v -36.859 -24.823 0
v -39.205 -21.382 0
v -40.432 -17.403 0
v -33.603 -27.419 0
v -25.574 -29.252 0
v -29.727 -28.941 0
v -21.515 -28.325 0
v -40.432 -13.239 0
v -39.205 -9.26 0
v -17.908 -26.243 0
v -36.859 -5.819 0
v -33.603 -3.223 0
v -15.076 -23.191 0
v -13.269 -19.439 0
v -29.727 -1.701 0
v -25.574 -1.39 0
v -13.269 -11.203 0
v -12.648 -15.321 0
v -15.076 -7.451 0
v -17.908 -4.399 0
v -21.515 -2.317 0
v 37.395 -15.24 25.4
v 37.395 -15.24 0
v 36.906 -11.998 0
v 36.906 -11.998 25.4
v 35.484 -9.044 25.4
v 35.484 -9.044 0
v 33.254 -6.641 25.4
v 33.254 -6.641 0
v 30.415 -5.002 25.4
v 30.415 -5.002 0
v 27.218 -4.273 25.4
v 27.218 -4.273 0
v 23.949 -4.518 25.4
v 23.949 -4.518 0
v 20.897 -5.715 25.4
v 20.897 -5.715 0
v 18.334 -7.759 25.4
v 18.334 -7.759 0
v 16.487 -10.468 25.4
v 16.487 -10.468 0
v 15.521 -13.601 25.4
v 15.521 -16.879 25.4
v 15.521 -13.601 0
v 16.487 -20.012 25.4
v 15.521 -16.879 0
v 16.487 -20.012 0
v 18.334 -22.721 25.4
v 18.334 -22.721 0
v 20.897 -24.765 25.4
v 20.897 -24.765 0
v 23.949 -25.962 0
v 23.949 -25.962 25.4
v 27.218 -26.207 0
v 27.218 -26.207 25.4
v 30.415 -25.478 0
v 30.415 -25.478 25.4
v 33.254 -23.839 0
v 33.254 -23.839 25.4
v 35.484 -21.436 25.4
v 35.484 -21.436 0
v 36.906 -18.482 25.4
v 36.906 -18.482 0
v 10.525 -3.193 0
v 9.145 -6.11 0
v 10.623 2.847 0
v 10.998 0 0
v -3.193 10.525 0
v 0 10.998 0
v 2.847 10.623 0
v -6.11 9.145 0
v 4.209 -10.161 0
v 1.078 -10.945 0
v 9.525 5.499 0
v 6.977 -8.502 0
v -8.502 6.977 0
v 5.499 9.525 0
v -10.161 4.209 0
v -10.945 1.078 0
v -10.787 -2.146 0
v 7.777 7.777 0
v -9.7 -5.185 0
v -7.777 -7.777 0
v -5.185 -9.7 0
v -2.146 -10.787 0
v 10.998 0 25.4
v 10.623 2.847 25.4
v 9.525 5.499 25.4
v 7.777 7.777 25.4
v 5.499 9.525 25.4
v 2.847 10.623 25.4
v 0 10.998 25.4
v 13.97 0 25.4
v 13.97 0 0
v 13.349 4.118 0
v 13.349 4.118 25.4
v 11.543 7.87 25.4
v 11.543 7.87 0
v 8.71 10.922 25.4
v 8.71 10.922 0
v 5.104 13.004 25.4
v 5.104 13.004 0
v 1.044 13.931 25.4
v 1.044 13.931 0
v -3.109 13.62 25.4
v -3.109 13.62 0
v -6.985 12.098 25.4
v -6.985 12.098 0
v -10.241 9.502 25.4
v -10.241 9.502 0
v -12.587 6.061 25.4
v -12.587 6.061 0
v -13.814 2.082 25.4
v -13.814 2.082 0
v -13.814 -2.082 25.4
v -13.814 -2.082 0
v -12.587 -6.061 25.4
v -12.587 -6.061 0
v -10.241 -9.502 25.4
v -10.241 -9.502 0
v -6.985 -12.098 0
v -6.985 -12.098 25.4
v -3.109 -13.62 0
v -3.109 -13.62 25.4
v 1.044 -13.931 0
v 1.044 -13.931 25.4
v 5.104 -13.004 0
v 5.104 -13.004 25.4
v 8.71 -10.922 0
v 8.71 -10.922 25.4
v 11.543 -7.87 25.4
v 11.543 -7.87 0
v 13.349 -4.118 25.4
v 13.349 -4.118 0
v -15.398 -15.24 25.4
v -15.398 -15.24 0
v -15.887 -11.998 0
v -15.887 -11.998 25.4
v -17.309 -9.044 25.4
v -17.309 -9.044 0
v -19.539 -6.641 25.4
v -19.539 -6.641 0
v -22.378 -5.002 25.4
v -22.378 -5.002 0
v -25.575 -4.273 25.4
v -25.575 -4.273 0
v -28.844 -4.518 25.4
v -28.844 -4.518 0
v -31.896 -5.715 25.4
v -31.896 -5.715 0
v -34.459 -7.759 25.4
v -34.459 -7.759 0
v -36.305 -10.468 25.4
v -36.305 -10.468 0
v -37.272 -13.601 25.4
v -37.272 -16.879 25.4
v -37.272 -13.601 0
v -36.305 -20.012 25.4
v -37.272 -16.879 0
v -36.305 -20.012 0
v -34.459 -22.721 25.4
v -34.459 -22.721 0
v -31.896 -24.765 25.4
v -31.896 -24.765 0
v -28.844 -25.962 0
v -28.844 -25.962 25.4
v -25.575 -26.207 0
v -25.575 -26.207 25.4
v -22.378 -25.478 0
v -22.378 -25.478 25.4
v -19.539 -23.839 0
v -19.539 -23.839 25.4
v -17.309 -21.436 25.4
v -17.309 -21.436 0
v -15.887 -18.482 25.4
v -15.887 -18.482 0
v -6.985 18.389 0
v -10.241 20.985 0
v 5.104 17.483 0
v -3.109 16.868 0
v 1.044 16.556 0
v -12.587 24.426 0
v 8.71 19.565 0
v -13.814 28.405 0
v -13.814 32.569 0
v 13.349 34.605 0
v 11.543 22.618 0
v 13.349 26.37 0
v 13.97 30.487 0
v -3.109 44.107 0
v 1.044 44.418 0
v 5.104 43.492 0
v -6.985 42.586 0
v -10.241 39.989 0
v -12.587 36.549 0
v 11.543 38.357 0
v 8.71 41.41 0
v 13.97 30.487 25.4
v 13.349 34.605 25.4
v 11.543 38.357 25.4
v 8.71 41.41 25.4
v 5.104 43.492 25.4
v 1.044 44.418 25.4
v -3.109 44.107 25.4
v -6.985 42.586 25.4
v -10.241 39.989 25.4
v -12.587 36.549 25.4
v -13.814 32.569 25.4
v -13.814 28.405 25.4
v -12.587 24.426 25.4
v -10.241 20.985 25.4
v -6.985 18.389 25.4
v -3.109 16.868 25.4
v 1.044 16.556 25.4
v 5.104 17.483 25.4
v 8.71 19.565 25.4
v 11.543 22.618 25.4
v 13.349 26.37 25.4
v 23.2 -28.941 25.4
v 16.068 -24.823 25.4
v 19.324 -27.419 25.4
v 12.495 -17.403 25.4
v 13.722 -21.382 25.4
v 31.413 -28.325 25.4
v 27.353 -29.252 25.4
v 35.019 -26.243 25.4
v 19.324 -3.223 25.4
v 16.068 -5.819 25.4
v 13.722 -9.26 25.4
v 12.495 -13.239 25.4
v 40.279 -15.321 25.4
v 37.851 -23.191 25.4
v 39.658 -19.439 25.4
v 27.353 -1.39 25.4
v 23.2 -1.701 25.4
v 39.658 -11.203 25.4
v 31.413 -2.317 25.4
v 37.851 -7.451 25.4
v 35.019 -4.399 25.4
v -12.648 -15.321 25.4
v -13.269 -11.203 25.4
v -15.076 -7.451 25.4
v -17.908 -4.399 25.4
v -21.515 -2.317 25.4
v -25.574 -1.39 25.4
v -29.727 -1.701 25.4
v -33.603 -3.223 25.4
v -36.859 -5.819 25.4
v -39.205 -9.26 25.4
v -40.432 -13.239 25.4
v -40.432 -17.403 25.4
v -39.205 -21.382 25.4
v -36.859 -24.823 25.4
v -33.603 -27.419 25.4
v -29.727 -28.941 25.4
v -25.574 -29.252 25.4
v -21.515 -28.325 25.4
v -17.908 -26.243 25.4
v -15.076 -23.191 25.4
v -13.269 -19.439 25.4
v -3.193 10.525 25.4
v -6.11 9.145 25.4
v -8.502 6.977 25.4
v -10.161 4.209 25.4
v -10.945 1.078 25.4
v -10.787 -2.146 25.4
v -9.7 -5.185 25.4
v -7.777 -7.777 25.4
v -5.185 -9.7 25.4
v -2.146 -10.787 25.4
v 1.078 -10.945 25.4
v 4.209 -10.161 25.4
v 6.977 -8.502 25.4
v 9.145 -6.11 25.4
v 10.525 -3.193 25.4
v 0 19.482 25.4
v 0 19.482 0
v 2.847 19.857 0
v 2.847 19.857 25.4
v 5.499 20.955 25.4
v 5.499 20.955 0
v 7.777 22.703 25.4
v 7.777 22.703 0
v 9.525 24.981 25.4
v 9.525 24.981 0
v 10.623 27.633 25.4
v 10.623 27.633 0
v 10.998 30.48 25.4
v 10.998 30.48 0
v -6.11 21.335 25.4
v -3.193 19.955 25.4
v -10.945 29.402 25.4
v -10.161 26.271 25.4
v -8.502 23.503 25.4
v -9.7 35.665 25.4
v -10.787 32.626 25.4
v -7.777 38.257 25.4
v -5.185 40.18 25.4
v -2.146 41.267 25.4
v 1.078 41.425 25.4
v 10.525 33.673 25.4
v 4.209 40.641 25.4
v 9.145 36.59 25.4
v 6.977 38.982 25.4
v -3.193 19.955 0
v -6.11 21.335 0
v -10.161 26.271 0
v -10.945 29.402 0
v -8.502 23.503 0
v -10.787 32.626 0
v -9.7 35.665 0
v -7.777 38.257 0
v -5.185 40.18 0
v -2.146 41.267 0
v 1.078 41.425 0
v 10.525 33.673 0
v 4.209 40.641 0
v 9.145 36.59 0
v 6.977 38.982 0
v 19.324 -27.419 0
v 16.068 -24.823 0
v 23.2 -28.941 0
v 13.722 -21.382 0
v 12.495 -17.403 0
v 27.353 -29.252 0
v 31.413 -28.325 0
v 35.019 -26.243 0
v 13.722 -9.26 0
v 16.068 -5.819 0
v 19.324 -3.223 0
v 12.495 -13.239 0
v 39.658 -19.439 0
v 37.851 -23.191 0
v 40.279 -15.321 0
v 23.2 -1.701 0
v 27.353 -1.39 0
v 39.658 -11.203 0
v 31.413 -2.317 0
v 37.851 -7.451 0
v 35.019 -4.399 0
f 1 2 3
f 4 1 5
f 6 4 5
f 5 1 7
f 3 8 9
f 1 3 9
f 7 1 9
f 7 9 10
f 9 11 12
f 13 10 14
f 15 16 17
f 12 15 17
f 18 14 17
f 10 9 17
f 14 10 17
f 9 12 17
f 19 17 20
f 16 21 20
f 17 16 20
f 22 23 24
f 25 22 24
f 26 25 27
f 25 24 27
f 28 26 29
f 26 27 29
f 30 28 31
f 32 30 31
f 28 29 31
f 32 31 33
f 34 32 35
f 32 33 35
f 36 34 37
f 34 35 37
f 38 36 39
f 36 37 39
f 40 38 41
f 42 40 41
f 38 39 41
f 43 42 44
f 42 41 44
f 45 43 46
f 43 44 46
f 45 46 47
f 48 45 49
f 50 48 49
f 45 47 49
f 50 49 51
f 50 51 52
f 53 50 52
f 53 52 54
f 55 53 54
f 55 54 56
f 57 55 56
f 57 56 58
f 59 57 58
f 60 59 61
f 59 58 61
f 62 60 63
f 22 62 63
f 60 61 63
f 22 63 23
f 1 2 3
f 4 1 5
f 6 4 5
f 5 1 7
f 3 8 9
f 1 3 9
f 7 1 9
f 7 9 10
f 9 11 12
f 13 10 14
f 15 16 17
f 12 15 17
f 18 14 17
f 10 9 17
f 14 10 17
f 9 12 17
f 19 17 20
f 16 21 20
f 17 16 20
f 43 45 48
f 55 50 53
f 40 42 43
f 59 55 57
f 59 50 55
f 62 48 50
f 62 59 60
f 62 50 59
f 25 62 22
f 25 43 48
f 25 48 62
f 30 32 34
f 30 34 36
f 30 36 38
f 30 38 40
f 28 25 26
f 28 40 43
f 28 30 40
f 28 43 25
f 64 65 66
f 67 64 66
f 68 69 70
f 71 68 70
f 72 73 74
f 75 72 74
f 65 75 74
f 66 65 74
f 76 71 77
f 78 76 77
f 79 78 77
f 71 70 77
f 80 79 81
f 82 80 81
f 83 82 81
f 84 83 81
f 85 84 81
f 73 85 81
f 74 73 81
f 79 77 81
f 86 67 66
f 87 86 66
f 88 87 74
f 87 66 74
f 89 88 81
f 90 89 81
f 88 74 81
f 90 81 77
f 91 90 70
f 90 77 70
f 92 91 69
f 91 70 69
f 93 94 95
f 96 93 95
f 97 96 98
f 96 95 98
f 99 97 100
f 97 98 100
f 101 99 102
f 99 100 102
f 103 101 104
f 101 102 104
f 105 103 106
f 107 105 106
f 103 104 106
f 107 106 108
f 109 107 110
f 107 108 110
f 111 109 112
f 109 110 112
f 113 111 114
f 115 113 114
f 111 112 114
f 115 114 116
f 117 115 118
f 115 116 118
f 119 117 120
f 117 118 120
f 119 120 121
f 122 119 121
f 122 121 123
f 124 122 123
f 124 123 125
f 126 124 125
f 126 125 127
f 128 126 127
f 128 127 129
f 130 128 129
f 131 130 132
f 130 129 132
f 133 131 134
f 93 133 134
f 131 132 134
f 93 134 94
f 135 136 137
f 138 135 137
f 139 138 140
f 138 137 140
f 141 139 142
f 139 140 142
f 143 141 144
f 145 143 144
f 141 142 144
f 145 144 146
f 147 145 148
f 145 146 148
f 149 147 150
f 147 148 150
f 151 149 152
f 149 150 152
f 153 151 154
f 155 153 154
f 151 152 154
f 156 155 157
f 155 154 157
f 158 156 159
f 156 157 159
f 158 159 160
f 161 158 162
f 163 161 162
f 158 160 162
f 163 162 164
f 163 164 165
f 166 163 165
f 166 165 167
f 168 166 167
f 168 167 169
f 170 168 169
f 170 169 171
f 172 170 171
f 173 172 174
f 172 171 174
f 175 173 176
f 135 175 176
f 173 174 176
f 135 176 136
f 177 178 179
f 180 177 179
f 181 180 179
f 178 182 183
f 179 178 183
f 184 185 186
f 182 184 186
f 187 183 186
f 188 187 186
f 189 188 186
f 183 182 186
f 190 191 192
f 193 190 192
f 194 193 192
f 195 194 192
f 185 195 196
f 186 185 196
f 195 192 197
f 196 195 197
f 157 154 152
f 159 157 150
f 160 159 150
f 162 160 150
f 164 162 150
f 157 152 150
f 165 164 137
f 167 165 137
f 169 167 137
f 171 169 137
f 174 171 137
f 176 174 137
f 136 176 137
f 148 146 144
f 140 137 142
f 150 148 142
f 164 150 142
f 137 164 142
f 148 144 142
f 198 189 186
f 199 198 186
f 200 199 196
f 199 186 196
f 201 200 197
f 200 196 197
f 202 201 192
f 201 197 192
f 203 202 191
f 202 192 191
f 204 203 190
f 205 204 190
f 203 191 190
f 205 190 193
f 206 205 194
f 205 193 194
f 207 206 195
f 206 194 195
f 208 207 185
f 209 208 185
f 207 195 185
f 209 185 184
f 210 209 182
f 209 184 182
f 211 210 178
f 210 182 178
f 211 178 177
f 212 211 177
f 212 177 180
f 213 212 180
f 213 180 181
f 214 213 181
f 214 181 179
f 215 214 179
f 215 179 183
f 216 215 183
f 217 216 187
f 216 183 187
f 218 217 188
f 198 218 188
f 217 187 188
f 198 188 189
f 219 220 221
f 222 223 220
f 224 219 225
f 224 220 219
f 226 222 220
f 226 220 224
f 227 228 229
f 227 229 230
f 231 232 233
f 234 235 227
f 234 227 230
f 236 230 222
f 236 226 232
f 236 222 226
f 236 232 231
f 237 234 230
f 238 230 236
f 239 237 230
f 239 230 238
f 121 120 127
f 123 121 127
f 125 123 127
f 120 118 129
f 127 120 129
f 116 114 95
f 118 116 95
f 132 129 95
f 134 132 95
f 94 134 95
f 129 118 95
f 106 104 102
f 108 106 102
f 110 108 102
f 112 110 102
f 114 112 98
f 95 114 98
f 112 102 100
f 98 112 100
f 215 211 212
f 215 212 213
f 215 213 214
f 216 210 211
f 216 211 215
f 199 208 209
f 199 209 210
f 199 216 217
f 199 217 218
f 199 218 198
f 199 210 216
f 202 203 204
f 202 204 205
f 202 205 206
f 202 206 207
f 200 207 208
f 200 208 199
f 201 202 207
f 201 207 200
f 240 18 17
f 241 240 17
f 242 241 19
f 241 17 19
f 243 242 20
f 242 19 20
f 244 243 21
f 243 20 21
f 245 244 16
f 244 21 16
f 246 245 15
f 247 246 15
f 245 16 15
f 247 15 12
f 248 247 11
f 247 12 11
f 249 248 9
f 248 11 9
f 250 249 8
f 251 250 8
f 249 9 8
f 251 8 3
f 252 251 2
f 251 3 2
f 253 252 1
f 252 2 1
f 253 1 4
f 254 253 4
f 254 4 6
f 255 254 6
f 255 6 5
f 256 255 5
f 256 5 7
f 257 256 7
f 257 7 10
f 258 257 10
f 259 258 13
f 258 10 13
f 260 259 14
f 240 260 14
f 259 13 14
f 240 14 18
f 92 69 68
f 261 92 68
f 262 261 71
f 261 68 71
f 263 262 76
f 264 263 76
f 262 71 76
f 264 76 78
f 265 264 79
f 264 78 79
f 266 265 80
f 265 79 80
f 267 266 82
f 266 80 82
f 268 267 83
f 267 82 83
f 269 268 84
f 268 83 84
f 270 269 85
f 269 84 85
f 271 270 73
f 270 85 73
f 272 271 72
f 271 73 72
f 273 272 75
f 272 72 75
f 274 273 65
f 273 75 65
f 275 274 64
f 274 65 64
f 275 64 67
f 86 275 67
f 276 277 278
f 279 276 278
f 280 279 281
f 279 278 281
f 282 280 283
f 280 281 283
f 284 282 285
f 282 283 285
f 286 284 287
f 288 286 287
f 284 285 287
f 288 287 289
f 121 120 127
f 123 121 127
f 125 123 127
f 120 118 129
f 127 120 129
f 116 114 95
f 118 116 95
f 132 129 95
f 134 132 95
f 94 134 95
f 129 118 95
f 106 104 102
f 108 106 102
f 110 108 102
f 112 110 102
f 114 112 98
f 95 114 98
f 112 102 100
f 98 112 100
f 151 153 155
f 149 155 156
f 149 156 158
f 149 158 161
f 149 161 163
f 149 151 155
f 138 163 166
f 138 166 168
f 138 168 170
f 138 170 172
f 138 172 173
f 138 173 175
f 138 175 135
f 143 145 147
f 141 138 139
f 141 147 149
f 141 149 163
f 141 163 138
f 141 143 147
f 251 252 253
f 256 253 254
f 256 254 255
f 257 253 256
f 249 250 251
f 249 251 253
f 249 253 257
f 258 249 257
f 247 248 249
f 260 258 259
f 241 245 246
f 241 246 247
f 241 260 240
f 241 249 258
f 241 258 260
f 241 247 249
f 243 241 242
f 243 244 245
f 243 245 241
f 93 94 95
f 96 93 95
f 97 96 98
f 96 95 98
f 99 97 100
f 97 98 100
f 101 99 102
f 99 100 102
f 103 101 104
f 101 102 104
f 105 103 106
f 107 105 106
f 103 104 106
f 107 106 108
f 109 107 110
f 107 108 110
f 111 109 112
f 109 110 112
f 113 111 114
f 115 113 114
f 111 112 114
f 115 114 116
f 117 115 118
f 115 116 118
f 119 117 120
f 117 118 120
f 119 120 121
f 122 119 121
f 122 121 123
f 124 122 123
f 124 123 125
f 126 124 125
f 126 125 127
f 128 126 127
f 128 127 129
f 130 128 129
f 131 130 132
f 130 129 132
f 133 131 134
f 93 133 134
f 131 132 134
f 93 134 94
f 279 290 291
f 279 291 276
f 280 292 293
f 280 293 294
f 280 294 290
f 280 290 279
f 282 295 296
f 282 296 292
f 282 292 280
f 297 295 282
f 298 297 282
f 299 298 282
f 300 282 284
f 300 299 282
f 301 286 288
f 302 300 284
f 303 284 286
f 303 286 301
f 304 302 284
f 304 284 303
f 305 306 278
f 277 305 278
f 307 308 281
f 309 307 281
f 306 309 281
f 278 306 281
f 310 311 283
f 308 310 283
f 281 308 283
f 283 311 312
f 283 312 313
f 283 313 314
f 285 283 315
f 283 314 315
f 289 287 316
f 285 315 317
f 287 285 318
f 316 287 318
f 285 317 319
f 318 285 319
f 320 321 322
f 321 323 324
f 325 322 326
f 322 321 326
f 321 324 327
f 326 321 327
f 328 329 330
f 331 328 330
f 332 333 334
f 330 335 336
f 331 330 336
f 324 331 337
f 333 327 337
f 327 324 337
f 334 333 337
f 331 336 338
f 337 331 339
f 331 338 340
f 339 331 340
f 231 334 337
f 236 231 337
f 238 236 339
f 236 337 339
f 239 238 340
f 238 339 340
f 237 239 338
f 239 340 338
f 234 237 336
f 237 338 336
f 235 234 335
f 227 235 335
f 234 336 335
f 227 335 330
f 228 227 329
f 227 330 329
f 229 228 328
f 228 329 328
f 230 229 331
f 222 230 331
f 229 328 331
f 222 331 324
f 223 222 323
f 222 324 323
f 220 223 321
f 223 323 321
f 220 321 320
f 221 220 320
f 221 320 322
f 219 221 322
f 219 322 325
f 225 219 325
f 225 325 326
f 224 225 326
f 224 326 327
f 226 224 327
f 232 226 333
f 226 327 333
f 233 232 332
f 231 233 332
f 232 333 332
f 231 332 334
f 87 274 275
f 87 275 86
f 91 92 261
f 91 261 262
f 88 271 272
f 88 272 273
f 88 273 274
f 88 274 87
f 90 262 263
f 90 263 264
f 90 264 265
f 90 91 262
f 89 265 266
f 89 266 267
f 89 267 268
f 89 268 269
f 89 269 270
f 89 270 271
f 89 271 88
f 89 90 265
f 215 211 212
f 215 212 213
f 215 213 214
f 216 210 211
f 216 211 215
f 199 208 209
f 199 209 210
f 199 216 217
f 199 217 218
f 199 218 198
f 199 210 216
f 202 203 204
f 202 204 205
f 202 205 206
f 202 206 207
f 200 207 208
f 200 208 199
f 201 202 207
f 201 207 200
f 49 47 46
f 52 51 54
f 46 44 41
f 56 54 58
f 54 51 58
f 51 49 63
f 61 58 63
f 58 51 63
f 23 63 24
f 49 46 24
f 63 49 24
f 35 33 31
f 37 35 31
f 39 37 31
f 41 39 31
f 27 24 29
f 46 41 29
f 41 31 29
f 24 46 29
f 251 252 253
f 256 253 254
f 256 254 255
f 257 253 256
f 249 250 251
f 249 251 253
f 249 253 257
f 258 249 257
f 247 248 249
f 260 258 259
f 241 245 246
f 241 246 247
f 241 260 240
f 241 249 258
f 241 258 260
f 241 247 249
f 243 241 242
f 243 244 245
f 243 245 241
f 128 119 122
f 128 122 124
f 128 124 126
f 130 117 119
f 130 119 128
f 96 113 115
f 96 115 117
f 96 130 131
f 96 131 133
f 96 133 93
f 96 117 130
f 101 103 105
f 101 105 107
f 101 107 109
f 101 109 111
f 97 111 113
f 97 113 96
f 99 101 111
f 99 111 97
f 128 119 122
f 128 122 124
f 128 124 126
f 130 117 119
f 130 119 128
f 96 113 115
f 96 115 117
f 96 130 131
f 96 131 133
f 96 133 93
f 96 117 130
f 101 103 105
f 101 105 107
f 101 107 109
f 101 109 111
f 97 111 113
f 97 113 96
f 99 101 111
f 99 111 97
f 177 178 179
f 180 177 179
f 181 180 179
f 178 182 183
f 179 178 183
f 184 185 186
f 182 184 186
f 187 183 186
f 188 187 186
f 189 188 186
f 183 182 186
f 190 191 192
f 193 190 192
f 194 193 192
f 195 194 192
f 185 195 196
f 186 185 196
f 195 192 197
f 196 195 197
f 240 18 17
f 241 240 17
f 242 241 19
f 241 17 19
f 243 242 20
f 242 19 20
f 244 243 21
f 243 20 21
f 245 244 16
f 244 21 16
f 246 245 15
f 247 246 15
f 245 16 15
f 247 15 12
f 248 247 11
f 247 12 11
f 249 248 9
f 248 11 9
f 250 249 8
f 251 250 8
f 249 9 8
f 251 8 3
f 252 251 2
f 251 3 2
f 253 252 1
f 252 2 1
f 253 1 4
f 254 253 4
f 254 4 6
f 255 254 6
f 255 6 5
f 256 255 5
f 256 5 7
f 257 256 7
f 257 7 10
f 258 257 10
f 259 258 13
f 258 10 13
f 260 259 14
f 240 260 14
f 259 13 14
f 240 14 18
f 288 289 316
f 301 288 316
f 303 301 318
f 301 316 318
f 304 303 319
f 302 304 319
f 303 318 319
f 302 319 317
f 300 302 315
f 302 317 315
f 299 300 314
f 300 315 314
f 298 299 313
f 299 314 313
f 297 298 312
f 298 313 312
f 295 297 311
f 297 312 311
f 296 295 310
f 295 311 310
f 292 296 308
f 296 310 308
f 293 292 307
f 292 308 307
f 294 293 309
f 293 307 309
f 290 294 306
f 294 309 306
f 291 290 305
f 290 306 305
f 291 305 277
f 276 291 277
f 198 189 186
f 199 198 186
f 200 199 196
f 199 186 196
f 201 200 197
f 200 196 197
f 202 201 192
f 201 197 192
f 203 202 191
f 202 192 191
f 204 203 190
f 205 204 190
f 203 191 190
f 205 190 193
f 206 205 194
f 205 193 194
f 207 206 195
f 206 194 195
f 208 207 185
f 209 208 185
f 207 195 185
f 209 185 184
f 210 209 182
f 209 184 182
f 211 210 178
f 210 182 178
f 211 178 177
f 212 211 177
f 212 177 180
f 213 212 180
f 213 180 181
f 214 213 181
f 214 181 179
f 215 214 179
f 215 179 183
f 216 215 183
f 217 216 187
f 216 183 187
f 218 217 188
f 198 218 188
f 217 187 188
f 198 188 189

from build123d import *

# Parameters (mm, degrees)
F0_R     = 10.9982
F3_DEPTH = 25.4
F1_R     = 13.97
F4_DEPTH = 25.4


with BuildPart() as f3:
    # F0 (on Top) → F3 (new body)
    with BuildSketch(Plane.XY):
        with Locations((-26.3964543073, -15.24)):
            Circle(F0_R)
    extrude(amount=F3_DEPTH)


with BuildPart() as f3b:
    # F0 (on Top) → F3, piece 2 (new body)
    with BuildSketch(Plane.XY):
        with BuildLine():
            ThreePointArc((0, 10.9982), (-7.7769018008, -7.7769018008), (10.9982, 0))
            ThreePointArc((10.9982, 0), (7.7769018008, 7.7769018008), (0, 10.9982))
        make_face()
    extrude(amount=F3_DEPTH)


with BuildPart() as f3c:
    # F0 (on Top) → F3, piece 3 (new body)
    with BuildSketch(Plane.XY):
        with BuildLine():
            ThreePointArc((10.9982, 30.48), (-7.7769018008, 38.2569018008), (0, 19.4818))
            ThreePointArc((0, 19.4818), (7.7769018008, 22.7030981992), (10.9982, 30.48))
        make_face()
    extrude(amount=F3_DEPTH)


with BuildPart() as f3d:
    # F0 (on Top) → F3, piece 4 (new body)
    with BuildSketch(Plane.XY):
        with Locations((26.3964543073, -15.24)):
            Circle(F0_R)
    extrude(amount=F3_DEPTH)


with BuildPart() as f3e:
    # F1 (on Top) → F3, piece 5 (new body)
    with BuildSketch(Plane.XY):
        Circle(F1_R)
    extrude(amount=F3_DEPTH)


with BuildPart() as f3f:
    # F1 (on Top) → F3, piece 6 (new body)
    with BuildSketch(Plane.XY):
        with Locations((0, 30.487369746)):
            Circle(F1_R)
    extrude(amount=F3_DEPTH)


with BuildPart() as f3g:
    # F1 (on Top) → F3, piece 7 (new body)
    with BuildSketch(Plane.XY):
        with Locations((-26.6184136271, -15.3210647404)):
            Circle(F1_R)
    extrude(amount=F3_DEPTH)


with BuildPart() as f4:
    # F1 (on Top) → F4 (new body)
    with BuildSketch(Plane.XY):
        Circle(F1_R)
    extrude(amount=F4_DEPTH)


with BuildPart() as f4b:
    # F1 (on Top) → F4, piece 2 (new body)
    with BuildSketch(Plane.XY):
        with Locations((-26.6184136271, -15.3210647404)):
            Circle(F1_R)
    extrude(amount=F4_DEPTH)


with BuildPart() as f4c:
    # F1 (on Top) → F4, piece 3 (new body)
    with BuildSketch(Plane.XY):
        with Locations((0, 30.487369746)):
            Circle(F1_R)
    extrude(amount=F4_DEPTH)


with BuildPart() as f4d:
    # F1 (on Top) → F4, piece 4 (new body)
    with BuildSketch(Plane.XY):
        with Locations((26.3088941574, -15.3210647404)):
            Circle(F1_R)
    extrude(amount=F4_DEPTH)


solid = Compound([f3.part, f3b.part, f3c.part, f3d.part, f3e.part, f3f.part, f3g.part, f4.part, f4b.part, f4c.part, f4d.part])
